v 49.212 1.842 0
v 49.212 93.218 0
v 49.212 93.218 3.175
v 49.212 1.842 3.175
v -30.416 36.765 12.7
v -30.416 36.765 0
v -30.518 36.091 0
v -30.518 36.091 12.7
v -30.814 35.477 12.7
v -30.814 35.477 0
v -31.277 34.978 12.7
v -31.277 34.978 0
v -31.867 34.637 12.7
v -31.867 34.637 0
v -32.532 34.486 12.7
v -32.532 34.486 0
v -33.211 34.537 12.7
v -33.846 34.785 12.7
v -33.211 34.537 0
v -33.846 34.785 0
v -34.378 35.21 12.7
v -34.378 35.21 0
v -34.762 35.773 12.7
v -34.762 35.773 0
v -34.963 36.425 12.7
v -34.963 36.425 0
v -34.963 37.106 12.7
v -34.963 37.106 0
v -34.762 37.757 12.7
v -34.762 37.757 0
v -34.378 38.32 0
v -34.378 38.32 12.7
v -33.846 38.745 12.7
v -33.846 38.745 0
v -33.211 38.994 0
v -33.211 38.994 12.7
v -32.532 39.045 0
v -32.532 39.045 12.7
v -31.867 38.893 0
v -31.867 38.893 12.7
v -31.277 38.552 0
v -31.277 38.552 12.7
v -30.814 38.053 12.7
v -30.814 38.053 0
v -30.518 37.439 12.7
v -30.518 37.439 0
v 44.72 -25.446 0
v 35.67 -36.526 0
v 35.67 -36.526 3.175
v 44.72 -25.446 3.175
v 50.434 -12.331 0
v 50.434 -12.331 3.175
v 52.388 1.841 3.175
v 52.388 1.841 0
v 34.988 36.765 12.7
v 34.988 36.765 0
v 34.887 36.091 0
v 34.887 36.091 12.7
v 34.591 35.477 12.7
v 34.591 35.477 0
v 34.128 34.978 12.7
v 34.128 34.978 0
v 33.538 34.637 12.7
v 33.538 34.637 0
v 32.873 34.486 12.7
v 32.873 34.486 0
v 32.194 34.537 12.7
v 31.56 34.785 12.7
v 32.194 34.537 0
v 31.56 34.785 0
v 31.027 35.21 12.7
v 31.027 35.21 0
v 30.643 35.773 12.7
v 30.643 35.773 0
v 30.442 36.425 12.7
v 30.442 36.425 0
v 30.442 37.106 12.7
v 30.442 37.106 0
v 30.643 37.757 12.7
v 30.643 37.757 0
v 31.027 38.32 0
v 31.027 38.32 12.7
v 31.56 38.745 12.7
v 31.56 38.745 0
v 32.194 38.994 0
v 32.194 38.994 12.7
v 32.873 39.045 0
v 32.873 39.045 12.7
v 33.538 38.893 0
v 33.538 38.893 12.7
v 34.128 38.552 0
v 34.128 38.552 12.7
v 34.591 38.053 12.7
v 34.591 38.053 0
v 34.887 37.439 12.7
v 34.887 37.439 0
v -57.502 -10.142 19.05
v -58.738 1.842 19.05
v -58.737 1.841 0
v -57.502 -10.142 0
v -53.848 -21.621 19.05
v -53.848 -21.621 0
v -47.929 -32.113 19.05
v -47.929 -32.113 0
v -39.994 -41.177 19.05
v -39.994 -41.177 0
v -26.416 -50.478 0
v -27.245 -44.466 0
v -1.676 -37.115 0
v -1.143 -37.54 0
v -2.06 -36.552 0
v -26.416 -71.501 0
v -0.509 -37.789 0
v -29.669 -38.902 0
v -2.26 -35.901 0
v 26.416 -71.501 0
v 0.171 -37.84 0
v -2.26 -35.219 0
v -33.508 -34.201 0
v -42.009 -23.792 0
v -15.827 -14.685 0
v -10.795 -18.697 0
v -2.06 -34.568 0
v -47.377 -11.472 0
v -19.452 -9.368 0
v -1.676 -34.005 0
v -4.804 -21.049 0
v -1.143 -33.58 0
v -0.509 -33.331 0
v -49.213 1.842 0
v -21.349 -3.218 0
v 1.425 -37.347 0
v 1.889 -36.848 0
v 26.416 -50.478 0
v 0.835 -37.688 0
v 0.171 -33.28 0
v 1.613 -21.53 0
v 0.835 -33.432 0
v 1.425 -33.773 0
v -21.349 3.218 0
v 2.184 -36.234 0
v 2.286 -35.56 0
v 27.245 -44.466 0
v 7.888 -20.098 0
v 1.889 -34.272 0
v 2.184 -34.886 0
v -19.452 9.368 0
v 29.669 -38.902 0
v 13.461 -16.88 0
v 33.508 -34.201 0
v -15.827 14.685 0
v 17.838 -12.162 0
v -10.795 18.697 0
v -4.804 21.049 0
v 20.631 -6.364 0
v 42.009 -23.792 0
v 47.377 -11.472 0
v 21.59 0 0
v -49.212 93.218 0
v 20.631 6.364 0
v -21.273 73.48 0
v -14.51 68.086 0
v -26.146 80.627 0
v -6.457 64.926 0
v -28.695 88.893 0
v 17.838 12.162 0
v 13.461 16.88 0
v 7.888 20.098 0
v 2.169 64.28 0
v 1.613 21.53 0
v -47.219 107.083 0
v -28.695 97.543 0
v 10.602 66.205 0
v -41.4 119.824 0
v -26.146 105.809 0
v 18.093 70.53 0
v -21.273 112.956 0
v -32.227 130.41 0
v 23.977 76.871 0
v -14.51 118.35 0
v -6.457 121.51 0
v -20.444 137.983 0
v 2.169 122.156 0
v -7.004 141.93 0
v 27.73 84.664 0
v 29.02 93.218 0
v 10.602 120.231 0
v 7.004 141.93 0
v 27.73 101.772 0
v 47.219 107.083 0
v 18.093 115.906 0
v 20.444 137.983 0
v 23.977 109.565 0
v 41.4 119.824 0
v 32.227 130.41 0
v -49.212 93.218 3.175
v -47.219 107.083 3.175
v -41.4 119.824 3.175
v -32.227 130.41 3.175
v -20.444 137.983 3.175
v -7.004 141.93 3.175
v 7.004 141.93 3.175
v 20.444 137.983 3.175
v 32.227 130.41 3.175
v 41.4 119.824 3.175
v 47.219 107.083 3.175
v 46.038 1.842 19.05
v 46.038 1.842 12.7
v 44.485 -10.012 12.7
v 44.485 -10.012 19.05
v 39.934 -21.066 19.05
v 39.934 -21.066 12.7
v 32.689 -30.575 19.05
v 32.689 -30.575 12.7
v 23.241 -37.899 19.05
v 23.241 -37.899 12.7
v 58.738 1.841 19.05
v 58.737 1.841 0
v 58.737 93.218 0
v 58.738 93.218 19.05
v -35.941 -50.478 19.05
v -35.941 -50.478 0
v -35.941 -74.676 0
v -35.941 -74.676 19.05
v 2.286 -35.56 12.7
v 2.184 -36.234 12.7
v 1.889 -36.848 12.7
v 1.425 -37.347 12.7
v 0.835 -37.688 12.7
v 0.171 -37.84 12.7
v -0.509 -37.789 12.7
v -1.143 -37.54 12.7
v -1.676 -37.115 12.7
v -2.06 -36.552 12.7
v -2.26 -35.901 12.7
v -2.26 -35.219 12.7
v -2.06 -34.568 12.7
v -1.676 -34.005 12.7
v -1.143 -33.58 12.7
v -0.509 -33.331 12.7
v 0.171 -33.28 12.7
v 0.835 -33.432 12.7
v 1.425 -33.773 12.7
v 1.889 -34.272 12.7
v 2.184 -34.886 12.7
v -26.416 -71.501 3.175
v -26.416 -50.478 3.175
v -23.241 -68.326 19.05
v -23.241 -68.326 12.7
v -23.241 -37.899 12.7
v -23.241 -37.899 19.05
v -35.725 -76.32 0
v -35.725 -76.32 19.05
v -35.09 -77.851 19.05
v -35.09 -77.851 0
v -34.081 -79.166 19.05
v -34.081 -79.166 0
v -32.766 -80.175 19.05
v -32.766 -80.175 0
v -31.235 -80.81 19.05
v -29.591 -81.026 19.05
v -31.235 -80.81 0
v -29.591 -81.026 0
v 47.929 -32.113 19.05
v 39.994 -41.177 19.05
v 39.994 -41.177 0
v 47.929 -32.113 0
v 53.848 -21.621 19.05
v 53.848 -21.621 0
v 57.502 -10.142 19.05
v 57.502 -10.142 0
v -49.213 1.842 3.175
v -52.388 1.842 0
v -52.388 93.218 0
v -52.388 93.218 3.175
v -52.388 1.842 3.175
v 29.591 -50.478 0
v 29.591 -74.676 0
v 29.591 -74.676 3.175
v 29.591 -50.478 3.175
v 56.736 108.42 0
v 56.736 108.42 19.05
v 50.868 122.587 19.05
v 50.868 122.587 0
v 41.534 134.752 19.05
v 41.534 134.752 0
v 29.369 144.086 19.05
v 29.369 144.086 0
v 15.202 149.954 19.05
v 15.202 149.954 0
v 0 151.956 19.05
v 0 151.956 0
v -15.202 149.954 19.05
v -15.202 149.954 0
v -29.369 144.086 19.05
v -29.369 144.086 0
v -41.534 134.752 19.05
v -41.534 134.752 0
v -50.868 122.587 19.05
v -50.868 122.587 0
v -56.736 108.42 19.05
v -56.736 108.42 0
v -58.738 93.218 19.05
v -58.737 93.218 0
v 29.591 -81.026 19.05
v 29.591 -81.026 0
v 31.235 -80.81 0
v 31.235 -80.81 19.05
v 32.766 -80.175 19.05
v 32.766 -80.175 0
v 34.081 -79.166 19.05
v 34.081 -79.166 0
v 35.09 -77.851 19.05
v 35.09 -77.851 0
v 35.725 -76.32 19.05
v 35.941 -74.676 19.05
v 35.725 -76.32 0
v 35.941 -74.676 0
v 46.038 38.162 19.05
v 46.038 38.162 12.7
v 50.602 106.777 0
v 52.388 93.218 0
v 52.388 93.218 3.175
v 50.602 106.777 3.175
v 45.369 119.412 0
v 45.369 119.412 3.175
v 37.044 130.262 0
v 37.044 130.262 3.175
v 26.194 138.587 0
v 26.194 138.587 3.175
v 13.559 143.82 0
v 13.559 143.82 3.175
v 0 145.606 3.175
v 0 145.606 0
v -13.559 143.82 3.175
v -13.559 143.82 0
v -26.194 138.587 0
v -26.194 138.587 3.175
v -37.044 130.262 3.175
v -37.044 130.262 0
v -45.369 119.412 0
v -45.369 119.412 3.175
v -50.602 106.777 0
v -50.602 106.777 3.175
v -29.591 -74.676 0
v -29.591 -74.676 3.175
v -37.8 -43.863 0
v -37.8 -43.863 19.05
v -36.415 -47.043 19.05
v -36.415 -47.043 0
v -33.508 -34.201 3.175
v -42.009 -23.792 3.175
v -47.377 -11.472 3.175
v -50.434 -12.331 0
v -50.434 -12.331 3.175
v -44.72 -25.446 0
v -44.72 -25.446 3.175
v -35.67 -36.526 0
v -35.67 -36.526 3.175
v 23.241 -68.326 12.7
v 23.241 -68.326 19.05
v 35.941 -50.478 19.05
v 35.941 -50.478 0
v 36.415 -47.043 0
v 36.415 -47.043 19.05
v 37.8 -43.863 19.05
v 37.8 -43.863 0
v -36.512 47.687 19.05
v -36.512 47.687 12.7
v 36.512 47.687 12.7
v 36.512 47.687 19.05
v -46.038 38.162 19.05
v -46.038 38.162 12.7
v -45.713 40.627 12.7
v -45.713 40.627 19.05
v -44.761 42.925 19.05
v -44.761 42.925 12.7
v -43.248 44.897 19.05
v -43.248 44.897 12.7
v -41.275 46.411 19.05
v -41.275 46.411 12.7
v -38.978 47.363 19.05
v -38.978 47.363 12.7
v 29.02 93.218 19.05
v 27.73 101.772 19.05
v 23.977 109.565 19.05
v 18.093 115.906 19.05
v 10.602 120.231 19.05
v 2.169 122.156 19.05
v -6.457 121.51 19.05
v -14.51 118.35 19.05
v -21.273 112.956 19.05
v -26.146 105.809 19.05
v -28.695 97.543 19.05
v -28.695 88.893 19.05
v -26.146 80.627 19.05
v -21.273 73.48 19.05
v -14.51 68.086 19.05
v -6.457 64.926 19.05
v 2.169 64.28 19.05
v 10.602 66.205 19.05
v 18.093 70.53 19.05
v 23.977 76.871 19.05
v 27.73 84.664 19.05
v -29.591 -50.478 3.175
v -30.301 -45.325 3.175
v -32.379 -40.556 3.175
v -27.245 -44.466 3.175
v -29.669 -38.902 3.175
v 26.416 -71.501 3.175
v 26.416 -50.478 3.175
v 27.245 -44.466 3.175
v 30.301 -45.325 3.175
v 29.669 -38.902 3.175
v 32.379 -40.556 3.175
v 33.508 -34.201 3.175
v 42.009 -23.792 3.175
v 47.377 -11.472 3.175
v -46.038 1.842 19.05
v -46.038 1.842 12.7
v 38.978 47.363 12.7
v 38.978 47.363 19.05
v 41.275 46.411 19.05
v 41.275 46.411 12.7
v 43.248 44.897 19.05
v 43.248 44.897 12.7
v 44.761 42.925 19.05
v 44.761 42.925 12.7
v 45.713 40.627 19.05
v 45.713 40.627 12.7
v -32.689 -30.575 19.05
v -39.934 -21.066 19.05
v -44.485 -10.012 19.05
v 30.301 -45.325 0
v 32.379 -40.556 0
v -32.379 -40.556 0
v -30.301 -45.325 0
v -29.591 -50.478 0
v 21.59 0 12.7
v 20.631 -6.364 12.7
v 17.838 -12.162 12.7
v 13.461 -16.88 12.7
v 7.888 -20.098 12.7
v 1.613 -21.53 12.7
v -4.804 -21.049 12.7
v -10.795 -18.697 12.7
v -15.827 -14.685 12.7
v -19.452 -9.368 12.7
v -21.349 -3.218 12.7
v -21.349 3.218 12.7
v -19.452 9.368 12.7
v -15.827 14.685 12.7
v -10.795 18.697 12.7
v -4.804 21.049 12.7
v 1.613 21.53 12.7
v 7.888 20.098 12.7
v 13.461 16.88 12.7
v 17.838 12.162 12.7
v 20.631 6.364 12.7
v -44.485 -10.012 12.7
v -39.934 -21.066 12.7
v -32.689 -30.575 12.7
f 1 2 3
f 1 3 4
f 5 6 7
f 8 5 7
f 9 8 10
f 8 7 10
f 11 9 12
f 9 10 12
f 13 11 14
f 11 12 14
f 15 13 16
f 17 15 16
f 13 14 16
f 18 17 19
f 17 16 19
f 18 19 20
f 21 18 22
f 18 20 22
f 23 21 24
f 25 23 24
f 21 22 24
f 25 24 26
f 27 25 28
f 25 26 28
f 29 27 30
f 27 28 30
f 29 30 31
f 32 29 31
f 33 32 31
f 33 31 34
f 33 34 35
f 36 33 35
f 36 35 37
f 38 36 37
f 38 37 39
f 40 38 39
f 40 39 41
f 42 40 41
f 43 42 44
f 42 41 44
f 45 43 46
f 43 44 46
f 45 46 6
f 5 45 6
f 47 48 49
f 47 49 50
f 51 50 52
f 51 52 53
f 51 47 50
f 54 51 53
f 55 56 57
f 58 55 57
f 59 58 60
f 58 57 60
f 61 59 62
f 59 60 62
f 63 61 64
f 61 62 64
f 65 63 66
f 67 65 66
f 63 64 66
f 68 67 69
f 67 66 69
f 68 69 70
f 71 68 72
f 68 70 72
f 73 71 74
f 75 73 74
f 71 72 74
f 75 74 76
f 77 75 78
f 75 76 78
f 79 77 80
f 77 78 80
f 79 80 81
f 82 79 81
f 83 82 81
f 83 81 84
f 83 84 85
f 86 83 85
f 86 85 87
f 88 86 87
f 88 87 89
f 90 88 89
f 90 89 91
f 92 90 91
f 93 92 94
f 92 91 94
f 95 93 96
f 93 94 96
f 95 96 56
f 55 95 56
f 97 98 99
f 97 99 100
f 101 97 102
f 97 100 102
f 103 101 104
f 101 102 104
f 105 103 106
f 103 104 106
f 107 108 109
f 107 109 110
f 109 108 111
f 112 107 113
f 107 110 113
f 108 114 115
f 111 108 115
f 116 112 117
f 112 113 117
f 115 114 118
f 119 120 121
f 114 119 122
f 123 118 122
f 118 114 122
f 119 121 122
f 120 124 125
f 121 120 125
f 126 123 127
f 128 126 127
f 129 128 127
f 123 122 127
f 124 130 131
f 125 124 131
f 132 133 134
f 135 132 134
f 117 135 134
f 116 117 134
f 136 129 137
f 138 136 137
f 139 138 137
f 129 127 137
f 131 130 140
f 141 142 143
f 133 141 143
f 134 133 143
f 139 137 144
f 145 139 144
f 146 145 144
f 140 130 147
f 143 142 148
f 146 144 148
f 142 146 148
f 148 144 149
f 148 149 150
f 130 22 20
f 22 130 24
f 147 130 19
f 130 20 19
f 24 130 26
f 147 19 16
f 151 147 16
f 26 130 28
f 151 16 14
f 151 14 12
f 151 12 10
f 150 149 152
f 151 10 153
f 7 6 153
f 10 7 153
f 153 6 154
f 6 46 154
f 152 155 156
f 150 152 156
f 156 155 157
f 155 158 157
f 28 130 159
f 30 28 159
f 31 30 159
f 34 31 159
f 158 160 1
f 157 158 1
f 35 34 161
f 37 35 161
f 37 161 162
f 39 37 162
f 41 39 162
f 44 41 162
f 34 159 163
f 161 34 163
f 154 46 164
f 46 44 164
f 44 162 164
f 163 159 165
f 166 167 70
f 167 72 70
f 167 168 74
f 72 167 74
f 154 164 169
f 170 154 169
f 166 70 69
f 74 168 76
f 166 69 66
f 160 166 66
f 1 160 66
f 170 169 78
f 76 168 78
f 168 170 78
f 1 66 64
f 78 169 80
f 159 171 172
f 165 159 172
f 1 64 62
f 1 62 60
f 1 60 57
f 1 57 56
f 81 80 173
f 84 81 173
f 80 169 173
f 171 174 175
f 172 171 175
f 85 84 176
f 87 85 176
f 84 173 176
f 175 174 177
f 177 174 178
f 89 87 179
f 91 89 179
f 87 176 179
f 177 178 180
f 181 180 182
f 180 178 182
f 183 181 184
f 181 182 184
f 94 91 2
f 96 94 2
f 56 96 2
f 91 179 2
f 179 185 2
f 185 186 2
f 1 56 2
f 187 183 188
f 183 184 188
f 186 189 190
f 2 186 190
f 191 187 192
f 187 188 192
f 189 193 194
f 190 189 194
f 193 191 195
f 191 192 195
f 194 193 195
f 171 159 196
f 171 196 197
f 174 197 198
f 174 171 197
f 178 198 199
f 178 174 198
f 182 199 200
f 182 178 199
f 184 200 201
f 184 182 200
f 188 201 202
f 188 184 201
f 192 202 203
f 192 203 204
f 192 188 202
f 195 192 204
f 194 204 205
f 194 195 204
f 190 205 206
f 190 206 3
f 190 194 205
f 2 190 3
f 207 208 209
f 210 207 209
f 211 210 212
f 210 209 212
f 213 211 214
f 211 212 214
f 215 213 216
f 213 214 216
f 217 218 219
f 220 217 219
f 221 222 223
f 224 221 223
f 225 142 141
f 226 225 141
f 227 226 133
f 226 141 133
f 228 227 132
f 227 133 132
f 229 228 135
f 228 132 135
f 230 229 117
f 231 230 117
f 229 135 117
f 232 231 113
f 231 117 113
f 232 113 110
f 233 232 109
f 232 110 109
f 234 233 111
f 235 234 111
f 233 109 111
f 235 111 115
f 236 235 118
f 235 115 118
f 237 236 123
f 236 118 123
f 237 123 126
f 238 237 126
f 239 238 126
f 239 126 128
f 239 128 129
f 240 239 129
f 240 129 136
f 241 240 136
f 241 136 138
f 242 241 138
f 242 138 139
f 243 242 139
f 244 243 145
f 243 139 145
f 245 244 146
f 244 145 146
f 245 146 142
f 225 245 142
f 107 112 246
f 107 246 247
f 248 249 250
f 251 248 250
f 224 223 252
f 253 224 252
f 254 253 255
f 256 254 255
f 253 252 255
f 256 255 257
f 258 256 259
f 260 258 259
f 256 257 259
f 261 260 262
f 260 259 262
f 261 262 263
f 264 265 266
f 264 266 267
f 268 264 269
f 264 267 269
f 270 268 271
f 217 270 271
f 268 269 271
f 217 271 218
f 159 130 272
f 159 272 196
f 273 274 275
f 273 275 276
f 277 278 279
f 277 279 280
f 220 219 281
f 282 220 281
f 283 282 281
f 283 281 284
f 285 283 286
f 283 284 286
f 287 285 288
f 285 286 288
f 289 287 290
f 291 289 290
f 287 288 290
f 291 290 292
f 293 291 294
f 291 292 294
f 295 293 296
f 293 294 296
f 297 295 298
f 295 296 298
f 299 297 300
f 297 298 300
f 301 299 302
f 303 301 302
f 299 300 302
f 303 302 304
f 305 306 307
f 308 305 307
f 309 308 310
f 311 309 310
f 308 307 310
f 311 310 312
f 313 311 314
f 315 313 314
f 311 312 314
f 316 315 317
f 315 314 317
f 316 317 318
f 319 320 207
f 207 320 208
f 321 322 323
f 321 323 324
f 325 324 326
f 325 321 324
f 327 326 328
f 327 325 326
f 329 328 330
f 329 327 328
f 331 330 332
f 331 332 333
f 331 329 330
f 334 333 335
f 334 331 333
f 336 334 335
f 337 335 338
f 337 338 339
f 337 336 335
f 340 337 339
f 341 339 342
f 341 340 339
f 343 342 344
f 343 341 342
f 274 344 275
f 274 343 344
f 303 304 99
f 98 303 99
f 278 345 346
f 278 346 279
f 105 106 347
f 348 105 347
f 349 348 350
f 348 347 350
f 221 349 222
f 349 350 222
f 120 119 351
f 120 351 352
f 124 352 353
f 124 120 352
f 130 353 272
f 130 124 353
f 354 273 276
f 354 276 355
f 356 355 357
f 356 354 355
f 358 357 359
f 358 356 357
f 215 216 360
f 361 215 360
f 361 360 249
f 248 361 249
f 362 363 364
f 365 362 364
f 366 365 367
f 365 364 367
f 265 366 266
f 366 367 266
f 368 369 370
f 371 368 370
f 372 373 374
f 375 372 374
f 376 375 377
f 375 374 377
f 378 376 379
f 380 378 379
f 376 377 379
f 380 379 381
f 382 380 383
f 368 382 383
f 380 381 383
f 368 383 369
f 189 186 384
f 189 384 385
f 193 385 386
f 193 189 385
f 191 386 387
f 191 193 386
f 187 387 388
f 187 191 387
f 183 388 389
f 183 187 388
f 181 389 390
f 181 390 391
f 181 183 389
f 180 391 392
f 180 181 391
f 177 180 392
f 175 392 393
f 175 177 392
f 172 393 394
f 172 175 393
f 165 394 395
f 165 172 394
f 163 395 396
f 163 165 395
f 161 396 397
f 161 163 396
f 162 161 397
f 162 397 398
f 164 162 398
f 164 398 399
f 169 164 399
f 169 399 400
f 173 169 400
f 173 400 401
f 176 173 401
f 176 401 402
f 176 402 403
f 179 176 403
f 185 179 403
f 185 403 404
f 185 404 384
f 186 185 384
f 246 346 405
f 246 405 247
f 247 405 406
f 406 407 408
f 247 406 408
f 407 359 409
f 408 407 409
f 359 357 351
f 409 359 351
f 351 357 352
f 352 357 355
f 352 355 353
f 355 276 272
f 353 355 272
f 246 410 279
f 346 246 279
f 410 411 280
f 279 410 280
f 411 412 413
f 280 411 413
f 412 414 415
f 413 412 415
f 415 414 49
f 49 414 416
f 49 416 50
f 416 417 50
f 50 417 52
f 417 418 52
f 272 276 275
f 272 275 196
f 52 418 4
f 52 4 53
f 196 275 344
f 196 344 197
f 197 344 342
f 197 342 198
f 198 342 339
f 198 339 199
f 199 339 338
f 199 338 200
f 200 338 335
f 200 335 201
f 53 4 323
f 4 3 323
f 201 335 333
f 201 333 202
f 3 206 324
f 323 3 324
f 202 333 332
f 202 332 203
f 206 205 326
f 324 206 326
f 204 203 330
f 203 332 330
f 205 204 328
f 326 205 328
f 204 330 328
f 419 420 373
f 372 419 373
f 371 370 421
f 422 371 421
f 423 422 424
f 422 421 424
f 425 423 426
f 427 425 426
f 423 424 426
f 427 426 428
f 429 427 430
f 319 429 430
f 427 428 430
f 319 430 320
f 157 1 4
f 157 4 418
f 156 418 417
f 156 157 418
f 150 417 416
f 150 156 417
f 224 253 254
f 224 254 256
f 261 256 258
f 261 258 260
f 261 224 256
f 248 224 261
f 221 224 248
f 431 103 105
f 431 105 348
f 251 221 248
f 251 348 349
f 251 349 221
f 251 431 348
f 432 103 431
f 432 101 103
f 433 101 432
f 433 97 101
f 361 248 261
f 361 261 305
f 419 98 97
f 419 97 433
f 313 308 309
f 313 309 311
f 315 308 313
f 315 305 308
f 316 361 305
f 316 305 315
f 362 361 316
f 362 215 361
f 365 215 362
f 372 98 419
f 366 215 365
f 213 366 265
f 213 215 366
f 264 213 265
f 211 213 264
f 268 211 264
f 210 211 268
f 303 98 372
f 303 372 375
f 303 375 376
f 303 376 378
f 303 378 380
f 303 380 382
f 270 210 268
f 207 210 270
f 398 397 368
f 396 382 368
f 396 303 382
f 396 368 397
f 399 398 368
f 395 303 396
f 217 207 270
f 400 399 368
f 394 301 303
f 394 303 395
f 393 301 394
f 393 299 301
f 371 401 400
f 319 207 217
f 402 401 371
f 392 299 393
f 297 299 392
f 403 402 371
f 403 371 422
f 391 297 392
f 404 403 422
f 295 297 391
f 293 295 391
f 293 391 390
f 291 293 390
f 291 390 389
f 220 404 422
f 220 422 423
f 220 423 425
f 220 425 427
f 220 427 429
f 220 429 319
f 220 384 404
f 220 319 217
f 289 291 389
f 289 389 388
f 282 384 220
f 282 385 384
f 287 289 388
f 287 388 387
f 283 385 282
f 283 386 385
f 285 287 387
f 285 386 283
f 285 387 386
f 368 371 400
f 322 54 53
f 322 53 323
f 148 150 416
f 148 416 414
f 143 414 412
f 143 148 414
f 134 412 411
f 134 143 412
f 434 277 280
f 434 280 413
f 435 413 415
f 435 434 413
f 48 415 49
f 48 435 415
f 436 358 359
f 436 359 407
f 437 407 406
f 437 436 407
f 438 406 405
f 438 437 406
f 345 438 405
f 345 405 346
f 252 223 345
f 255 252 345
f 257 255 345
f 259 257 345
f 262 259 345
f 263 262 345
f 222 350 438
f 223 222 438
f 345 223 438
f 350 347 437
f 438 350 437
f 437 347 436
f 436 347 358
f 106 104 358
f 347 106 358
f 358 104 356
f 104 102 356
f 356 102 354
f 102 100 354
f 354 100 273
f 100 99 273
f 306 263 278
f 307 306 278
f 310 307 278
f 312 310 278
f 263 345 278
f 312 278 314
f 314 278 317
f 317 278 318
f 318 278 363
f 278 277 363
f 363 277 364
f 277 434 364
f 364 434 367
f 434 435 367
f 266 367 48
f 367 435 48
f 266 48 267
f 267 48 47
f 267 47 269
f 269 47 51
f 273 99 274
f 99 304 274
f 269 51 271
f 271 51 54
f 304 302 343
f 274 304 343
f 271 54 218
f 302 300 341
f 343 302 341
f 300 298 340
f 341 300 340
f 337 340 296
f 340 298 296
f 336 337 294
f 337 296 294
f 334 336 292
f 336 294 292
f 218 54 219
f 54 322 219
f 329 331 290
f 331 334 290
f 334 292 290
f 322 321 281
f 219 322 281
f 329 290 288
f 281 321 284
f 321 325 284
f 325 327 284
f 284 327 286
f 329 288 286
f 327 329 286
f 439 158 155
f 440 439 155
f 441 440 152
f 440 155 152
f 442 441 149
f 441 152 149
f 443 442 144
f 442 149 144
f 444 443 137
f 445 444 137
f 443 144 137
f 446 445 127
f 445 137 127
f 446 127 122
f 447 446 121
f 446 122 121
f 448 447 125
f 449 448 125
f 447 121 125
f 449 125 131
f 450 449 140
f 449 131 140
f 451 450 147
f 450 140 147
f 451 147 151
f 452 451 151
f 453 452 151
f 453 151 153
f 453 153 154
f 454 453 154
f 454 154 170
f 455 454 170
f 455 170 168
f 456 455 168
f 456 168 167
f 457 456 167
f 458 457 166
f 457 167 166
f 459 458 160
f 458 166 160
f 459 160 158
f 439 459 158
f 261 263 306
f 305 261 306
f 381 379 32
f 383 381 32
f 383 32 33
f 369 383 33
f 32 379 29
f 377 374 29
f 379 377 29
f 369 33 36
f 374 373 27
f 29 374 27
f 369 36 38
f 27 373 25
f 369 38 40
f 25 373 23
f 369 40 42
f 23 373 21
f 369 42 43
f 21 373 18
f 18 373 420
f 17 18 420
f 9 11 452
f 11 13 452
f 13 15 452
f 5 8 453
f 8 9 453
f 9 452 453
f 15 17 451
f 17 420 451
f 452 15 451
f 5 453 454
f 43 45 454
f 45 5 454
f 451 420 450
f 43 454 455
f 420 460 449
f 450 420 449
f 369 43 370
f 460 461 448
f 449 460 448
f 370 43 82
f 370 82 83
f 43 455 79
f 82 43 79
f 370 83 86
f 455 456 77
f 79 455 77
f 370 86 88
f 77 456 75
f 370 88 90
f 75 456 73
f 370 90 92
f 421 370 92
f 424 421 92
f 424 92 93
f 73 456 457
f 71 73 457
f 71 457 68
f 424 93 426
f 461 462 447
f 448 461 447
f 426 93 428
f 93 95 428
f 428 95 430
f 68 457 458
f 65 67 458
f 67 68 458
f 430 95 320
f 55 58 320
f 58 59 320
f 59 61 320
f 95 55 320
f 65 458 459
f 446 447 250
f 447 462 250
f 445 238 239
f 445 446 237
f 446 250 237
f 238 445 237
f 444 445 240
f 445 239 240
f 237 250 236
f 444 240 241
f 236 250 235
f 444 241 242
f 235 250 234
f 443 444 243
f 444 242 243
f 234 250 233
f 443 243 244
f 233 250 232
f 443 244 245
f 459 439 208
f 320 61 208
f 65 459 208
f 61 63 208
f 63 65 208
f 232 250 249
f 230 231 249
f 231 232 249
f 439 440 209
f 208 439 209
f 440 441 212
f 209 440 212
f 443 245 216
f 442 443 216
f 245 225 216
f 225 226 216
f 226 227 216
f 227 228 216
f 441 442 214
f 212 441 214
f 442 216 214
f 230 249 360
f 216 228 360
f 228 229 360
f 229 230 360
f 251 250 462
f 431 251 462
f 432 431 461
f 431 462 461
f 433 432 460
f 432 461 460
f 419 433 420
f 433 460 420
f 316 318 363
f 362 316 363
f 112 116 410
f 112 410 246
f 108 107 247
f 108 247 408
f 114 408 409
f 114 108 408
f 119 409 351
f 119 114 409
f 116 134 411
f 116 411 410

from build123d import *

# Parameters (mm, degrees)
F0_R     = 29.0195
F1_DEPTH = 19.05
F2_R     = 2.286
F2_R_2   = 29.0195
F2_R_3   = 21.59
F3_DEPTH = 12.7
F5_DEPTH = 3.175


with BuildPart() as f1:
    # F0 (on Top) → F1 (new body)
    with BuildSketch(Plane.XY):
        with BuildLine():
            Line((58.7375, 1.8415), (58.7375, 93.218))
            ThreePointArc((58.7375, 93.218), (0, 151.9555), (-58.7375, 93.218))
            Line((-58.7375, 93.218), (-58.7375, 1.8415))
            ThreePointArc((-58.7375, 1.8415), (-53.848048, -21.620845), (-39.993711, -41.177066))
            ThreePointArc((-39.993711, -41.177066), (-36.998179, -45.405437), (-35.941, -50.478377))
            Line((-35.941, -50.478377), (-35.941, -74.676))
            ThreePointArc((-35.941, -74.676), (-34.081128, -79.166128), (-29.591, -81.026))
            Line((-29.591, -81.026), (29.591, -81.026))
            ThreePointArc((29.591, -81.026), (34.081128, -79.166128), (35.941, -74.676))
            Line((35.941, -74.676), (35.941, -50.478377))
            ThreePointArc((35.941, -50.478377), (36.998179, -45.405437), (39.993711, -41.177066))
            ThreePointArc((39.993711, -41.177066), (53.848048, -21.620845), (58.7375, 1.8415))
        make_face()
        with BuildLine():
            ThreePointArc((-23.241, -37.899), (-39.933751, -21.065855), (-46.0375, 1.8415))
            Line((-46.0375, 1.8415), (-46.0375, 38.162218))
            ThreePointArc((-46.0375, 38.162218), (-43.247692, 44.89741), (-36.5125, 47.687218))
            Line((-36.5125, 47.687218), (36.5125, 47.687218))
            ThreePointArc((36.5125, 47.687218), (43.247692, 44.89741), (46.0375, 38.162218))
            Line((46.0375, 38.162218), (46.0375, 1.8415))
            ThreePointArc((46.0375, 1.8415), (39.933751, -21.065855), (23.241, -37.899))
            Line((23.241, -37.899), (23.241, -68.326))
            Line((23.241, -68.326), (-23.241, -68.326))
            Line((-23.241, -68.326), (-23.241, -37.899))
        make_face(mode=Mode.SUBTRACT)
        with Locations((0, 93.218)):
            Circle(F0_R, mode=Mode.SUBTRACT)
    extrude(amount=F1_DEPTH)

    # F2 (on face) → F3 (join)
    with BuildSketch(Plane(origin=(0, 0, 0), x_dir=(1, 0, 0), z_dir=(0, 0, -1))):
        with BuildLine():
            ThreePointArc((-58.7375, -93.218), (0, -151.9555), (58.7375, -93.218))
            Line((58.7375, -93.218), (58.7375, -1.8415))
            ThreePointArc((58.7375, -1.8415), (53.848048, 21.620845), (39.993711, 41.177066))
            ThreePointArc((39.993711, 41.177066), (36.998179, 45.405437), (35.941, 50.478377))
            Line((35.941, 50.478377), (35.941, 74.676))
            ThreePointArc((35.941, 74.676), (34.081128, 79.166128), (29.591, 81.026))
            Line((29.591, 81.026), (-29.591, 81.026))
            ThreePointArc((-29.591, 81.026), (-34.081128, 79.166128), (-35.941, 74.676))
            Line((-35.941, 74.676), (-35.941, 50.478377))
            ThreePointArc((-35.941, 50.478377), (-36.998179, 45.405437), (-39.993711, 41.177066))
            ThreePointArc((-39.993711, 41.177066), (-53.848048, 21.620845), (-58.7375, -1.8415))
            Line((-58.7375, -1.8415), (-58.7375, -93.218))
        make_face()
        with Locations((-32.7025, -36.765218)):
            Circle(F2_R, mode=Mode.SUBTRACT)
        with Locations((0, -93.218)):
            Circle(F2_R_2, mode=Mode.SUBTRACT)
        with Locations((32.7025, -36.765218)):
            Circle(F2_R, mode=Mode.SUBTRACT)
        Circle(F2_R_3, mode=Mode.SUBTRACT)
        with Locations((0, 35.56)):
            Circle(F2_R, mode=Mode.SUBTRACT)
    extrude(amount=-F3_DEPTH)

    # F4 (on face) → F5 (cut)
    with BuildSketch(Plane.XY):
        with BuildLine():
            ThreePointArc((-52.3875, 1.8415), (-48.026637, -19.084375), (-35.670066, -36.52641))
            ThreePointArc((-35.670066, -36.52641), (-31.176768, -42.868968), (-29.591, -50.478377))
            Line((-29.591, -50.478377), (-29.591, -74.676))
            Line((-29.591, -74.676), (29.591, -74.676))
            Line((29.591, -74.676), (29.591, -50.478377))
            ThreePointArc((29.591, -50.478377), (31.176768, -42.868968), (35.670066, -36.52641))
            ThreePointArc((35.670066, -36.52641), (48.026637, -19.084375), (52.3875, 1.8415))
            Line((52.3875, 1.8415), (52.3875, 93.218))
            ThreePointArc((52.3875, 93.218), (0, 145.6055), (-52.3875, 93.218))
            Line((-52.3875, 93.218), (-52.3875, 1.8415))
        make_face()
        with BuildLine():
            ThreePointArc((-33.508244, -34.201082), (-45.115932, -17.816141), (-49.2125, 1.8415))
            Line((-49.2125, 1.8415), (-49.2125, 93.218))
            ThreePointArc((-49.2125, 93.218), (0, 142.4305), (49.2125, 93.218))
            Line((49.2125, 93.218), (49.2125, 1.8415))
            ThreePointArc((49.2125, 1.8415), (45.115932, -17.816141), (33.508244, -34.201082))
            ThreePointArc((33.508244, -34.201082), (28.266063, -41.600733), (26.416, -50.478377))
            Line((26.416, -50.478377), (26.416, -71.501))
            Line((26.416, -71.501), (-26.416, -71.501))
            Line((-26.416, -71.501), (-26.416, -50.478377))
            ThreePointArc((-26.416, -50.478377), (-28.266063, -41.600733), (-33.508244, -34.201082))
        make_face(mode=Mode.SUBTRACT)
    extrude(amount=F5_DEPTH, mode=Mode.SUBTRACT)


solid = f1.part
